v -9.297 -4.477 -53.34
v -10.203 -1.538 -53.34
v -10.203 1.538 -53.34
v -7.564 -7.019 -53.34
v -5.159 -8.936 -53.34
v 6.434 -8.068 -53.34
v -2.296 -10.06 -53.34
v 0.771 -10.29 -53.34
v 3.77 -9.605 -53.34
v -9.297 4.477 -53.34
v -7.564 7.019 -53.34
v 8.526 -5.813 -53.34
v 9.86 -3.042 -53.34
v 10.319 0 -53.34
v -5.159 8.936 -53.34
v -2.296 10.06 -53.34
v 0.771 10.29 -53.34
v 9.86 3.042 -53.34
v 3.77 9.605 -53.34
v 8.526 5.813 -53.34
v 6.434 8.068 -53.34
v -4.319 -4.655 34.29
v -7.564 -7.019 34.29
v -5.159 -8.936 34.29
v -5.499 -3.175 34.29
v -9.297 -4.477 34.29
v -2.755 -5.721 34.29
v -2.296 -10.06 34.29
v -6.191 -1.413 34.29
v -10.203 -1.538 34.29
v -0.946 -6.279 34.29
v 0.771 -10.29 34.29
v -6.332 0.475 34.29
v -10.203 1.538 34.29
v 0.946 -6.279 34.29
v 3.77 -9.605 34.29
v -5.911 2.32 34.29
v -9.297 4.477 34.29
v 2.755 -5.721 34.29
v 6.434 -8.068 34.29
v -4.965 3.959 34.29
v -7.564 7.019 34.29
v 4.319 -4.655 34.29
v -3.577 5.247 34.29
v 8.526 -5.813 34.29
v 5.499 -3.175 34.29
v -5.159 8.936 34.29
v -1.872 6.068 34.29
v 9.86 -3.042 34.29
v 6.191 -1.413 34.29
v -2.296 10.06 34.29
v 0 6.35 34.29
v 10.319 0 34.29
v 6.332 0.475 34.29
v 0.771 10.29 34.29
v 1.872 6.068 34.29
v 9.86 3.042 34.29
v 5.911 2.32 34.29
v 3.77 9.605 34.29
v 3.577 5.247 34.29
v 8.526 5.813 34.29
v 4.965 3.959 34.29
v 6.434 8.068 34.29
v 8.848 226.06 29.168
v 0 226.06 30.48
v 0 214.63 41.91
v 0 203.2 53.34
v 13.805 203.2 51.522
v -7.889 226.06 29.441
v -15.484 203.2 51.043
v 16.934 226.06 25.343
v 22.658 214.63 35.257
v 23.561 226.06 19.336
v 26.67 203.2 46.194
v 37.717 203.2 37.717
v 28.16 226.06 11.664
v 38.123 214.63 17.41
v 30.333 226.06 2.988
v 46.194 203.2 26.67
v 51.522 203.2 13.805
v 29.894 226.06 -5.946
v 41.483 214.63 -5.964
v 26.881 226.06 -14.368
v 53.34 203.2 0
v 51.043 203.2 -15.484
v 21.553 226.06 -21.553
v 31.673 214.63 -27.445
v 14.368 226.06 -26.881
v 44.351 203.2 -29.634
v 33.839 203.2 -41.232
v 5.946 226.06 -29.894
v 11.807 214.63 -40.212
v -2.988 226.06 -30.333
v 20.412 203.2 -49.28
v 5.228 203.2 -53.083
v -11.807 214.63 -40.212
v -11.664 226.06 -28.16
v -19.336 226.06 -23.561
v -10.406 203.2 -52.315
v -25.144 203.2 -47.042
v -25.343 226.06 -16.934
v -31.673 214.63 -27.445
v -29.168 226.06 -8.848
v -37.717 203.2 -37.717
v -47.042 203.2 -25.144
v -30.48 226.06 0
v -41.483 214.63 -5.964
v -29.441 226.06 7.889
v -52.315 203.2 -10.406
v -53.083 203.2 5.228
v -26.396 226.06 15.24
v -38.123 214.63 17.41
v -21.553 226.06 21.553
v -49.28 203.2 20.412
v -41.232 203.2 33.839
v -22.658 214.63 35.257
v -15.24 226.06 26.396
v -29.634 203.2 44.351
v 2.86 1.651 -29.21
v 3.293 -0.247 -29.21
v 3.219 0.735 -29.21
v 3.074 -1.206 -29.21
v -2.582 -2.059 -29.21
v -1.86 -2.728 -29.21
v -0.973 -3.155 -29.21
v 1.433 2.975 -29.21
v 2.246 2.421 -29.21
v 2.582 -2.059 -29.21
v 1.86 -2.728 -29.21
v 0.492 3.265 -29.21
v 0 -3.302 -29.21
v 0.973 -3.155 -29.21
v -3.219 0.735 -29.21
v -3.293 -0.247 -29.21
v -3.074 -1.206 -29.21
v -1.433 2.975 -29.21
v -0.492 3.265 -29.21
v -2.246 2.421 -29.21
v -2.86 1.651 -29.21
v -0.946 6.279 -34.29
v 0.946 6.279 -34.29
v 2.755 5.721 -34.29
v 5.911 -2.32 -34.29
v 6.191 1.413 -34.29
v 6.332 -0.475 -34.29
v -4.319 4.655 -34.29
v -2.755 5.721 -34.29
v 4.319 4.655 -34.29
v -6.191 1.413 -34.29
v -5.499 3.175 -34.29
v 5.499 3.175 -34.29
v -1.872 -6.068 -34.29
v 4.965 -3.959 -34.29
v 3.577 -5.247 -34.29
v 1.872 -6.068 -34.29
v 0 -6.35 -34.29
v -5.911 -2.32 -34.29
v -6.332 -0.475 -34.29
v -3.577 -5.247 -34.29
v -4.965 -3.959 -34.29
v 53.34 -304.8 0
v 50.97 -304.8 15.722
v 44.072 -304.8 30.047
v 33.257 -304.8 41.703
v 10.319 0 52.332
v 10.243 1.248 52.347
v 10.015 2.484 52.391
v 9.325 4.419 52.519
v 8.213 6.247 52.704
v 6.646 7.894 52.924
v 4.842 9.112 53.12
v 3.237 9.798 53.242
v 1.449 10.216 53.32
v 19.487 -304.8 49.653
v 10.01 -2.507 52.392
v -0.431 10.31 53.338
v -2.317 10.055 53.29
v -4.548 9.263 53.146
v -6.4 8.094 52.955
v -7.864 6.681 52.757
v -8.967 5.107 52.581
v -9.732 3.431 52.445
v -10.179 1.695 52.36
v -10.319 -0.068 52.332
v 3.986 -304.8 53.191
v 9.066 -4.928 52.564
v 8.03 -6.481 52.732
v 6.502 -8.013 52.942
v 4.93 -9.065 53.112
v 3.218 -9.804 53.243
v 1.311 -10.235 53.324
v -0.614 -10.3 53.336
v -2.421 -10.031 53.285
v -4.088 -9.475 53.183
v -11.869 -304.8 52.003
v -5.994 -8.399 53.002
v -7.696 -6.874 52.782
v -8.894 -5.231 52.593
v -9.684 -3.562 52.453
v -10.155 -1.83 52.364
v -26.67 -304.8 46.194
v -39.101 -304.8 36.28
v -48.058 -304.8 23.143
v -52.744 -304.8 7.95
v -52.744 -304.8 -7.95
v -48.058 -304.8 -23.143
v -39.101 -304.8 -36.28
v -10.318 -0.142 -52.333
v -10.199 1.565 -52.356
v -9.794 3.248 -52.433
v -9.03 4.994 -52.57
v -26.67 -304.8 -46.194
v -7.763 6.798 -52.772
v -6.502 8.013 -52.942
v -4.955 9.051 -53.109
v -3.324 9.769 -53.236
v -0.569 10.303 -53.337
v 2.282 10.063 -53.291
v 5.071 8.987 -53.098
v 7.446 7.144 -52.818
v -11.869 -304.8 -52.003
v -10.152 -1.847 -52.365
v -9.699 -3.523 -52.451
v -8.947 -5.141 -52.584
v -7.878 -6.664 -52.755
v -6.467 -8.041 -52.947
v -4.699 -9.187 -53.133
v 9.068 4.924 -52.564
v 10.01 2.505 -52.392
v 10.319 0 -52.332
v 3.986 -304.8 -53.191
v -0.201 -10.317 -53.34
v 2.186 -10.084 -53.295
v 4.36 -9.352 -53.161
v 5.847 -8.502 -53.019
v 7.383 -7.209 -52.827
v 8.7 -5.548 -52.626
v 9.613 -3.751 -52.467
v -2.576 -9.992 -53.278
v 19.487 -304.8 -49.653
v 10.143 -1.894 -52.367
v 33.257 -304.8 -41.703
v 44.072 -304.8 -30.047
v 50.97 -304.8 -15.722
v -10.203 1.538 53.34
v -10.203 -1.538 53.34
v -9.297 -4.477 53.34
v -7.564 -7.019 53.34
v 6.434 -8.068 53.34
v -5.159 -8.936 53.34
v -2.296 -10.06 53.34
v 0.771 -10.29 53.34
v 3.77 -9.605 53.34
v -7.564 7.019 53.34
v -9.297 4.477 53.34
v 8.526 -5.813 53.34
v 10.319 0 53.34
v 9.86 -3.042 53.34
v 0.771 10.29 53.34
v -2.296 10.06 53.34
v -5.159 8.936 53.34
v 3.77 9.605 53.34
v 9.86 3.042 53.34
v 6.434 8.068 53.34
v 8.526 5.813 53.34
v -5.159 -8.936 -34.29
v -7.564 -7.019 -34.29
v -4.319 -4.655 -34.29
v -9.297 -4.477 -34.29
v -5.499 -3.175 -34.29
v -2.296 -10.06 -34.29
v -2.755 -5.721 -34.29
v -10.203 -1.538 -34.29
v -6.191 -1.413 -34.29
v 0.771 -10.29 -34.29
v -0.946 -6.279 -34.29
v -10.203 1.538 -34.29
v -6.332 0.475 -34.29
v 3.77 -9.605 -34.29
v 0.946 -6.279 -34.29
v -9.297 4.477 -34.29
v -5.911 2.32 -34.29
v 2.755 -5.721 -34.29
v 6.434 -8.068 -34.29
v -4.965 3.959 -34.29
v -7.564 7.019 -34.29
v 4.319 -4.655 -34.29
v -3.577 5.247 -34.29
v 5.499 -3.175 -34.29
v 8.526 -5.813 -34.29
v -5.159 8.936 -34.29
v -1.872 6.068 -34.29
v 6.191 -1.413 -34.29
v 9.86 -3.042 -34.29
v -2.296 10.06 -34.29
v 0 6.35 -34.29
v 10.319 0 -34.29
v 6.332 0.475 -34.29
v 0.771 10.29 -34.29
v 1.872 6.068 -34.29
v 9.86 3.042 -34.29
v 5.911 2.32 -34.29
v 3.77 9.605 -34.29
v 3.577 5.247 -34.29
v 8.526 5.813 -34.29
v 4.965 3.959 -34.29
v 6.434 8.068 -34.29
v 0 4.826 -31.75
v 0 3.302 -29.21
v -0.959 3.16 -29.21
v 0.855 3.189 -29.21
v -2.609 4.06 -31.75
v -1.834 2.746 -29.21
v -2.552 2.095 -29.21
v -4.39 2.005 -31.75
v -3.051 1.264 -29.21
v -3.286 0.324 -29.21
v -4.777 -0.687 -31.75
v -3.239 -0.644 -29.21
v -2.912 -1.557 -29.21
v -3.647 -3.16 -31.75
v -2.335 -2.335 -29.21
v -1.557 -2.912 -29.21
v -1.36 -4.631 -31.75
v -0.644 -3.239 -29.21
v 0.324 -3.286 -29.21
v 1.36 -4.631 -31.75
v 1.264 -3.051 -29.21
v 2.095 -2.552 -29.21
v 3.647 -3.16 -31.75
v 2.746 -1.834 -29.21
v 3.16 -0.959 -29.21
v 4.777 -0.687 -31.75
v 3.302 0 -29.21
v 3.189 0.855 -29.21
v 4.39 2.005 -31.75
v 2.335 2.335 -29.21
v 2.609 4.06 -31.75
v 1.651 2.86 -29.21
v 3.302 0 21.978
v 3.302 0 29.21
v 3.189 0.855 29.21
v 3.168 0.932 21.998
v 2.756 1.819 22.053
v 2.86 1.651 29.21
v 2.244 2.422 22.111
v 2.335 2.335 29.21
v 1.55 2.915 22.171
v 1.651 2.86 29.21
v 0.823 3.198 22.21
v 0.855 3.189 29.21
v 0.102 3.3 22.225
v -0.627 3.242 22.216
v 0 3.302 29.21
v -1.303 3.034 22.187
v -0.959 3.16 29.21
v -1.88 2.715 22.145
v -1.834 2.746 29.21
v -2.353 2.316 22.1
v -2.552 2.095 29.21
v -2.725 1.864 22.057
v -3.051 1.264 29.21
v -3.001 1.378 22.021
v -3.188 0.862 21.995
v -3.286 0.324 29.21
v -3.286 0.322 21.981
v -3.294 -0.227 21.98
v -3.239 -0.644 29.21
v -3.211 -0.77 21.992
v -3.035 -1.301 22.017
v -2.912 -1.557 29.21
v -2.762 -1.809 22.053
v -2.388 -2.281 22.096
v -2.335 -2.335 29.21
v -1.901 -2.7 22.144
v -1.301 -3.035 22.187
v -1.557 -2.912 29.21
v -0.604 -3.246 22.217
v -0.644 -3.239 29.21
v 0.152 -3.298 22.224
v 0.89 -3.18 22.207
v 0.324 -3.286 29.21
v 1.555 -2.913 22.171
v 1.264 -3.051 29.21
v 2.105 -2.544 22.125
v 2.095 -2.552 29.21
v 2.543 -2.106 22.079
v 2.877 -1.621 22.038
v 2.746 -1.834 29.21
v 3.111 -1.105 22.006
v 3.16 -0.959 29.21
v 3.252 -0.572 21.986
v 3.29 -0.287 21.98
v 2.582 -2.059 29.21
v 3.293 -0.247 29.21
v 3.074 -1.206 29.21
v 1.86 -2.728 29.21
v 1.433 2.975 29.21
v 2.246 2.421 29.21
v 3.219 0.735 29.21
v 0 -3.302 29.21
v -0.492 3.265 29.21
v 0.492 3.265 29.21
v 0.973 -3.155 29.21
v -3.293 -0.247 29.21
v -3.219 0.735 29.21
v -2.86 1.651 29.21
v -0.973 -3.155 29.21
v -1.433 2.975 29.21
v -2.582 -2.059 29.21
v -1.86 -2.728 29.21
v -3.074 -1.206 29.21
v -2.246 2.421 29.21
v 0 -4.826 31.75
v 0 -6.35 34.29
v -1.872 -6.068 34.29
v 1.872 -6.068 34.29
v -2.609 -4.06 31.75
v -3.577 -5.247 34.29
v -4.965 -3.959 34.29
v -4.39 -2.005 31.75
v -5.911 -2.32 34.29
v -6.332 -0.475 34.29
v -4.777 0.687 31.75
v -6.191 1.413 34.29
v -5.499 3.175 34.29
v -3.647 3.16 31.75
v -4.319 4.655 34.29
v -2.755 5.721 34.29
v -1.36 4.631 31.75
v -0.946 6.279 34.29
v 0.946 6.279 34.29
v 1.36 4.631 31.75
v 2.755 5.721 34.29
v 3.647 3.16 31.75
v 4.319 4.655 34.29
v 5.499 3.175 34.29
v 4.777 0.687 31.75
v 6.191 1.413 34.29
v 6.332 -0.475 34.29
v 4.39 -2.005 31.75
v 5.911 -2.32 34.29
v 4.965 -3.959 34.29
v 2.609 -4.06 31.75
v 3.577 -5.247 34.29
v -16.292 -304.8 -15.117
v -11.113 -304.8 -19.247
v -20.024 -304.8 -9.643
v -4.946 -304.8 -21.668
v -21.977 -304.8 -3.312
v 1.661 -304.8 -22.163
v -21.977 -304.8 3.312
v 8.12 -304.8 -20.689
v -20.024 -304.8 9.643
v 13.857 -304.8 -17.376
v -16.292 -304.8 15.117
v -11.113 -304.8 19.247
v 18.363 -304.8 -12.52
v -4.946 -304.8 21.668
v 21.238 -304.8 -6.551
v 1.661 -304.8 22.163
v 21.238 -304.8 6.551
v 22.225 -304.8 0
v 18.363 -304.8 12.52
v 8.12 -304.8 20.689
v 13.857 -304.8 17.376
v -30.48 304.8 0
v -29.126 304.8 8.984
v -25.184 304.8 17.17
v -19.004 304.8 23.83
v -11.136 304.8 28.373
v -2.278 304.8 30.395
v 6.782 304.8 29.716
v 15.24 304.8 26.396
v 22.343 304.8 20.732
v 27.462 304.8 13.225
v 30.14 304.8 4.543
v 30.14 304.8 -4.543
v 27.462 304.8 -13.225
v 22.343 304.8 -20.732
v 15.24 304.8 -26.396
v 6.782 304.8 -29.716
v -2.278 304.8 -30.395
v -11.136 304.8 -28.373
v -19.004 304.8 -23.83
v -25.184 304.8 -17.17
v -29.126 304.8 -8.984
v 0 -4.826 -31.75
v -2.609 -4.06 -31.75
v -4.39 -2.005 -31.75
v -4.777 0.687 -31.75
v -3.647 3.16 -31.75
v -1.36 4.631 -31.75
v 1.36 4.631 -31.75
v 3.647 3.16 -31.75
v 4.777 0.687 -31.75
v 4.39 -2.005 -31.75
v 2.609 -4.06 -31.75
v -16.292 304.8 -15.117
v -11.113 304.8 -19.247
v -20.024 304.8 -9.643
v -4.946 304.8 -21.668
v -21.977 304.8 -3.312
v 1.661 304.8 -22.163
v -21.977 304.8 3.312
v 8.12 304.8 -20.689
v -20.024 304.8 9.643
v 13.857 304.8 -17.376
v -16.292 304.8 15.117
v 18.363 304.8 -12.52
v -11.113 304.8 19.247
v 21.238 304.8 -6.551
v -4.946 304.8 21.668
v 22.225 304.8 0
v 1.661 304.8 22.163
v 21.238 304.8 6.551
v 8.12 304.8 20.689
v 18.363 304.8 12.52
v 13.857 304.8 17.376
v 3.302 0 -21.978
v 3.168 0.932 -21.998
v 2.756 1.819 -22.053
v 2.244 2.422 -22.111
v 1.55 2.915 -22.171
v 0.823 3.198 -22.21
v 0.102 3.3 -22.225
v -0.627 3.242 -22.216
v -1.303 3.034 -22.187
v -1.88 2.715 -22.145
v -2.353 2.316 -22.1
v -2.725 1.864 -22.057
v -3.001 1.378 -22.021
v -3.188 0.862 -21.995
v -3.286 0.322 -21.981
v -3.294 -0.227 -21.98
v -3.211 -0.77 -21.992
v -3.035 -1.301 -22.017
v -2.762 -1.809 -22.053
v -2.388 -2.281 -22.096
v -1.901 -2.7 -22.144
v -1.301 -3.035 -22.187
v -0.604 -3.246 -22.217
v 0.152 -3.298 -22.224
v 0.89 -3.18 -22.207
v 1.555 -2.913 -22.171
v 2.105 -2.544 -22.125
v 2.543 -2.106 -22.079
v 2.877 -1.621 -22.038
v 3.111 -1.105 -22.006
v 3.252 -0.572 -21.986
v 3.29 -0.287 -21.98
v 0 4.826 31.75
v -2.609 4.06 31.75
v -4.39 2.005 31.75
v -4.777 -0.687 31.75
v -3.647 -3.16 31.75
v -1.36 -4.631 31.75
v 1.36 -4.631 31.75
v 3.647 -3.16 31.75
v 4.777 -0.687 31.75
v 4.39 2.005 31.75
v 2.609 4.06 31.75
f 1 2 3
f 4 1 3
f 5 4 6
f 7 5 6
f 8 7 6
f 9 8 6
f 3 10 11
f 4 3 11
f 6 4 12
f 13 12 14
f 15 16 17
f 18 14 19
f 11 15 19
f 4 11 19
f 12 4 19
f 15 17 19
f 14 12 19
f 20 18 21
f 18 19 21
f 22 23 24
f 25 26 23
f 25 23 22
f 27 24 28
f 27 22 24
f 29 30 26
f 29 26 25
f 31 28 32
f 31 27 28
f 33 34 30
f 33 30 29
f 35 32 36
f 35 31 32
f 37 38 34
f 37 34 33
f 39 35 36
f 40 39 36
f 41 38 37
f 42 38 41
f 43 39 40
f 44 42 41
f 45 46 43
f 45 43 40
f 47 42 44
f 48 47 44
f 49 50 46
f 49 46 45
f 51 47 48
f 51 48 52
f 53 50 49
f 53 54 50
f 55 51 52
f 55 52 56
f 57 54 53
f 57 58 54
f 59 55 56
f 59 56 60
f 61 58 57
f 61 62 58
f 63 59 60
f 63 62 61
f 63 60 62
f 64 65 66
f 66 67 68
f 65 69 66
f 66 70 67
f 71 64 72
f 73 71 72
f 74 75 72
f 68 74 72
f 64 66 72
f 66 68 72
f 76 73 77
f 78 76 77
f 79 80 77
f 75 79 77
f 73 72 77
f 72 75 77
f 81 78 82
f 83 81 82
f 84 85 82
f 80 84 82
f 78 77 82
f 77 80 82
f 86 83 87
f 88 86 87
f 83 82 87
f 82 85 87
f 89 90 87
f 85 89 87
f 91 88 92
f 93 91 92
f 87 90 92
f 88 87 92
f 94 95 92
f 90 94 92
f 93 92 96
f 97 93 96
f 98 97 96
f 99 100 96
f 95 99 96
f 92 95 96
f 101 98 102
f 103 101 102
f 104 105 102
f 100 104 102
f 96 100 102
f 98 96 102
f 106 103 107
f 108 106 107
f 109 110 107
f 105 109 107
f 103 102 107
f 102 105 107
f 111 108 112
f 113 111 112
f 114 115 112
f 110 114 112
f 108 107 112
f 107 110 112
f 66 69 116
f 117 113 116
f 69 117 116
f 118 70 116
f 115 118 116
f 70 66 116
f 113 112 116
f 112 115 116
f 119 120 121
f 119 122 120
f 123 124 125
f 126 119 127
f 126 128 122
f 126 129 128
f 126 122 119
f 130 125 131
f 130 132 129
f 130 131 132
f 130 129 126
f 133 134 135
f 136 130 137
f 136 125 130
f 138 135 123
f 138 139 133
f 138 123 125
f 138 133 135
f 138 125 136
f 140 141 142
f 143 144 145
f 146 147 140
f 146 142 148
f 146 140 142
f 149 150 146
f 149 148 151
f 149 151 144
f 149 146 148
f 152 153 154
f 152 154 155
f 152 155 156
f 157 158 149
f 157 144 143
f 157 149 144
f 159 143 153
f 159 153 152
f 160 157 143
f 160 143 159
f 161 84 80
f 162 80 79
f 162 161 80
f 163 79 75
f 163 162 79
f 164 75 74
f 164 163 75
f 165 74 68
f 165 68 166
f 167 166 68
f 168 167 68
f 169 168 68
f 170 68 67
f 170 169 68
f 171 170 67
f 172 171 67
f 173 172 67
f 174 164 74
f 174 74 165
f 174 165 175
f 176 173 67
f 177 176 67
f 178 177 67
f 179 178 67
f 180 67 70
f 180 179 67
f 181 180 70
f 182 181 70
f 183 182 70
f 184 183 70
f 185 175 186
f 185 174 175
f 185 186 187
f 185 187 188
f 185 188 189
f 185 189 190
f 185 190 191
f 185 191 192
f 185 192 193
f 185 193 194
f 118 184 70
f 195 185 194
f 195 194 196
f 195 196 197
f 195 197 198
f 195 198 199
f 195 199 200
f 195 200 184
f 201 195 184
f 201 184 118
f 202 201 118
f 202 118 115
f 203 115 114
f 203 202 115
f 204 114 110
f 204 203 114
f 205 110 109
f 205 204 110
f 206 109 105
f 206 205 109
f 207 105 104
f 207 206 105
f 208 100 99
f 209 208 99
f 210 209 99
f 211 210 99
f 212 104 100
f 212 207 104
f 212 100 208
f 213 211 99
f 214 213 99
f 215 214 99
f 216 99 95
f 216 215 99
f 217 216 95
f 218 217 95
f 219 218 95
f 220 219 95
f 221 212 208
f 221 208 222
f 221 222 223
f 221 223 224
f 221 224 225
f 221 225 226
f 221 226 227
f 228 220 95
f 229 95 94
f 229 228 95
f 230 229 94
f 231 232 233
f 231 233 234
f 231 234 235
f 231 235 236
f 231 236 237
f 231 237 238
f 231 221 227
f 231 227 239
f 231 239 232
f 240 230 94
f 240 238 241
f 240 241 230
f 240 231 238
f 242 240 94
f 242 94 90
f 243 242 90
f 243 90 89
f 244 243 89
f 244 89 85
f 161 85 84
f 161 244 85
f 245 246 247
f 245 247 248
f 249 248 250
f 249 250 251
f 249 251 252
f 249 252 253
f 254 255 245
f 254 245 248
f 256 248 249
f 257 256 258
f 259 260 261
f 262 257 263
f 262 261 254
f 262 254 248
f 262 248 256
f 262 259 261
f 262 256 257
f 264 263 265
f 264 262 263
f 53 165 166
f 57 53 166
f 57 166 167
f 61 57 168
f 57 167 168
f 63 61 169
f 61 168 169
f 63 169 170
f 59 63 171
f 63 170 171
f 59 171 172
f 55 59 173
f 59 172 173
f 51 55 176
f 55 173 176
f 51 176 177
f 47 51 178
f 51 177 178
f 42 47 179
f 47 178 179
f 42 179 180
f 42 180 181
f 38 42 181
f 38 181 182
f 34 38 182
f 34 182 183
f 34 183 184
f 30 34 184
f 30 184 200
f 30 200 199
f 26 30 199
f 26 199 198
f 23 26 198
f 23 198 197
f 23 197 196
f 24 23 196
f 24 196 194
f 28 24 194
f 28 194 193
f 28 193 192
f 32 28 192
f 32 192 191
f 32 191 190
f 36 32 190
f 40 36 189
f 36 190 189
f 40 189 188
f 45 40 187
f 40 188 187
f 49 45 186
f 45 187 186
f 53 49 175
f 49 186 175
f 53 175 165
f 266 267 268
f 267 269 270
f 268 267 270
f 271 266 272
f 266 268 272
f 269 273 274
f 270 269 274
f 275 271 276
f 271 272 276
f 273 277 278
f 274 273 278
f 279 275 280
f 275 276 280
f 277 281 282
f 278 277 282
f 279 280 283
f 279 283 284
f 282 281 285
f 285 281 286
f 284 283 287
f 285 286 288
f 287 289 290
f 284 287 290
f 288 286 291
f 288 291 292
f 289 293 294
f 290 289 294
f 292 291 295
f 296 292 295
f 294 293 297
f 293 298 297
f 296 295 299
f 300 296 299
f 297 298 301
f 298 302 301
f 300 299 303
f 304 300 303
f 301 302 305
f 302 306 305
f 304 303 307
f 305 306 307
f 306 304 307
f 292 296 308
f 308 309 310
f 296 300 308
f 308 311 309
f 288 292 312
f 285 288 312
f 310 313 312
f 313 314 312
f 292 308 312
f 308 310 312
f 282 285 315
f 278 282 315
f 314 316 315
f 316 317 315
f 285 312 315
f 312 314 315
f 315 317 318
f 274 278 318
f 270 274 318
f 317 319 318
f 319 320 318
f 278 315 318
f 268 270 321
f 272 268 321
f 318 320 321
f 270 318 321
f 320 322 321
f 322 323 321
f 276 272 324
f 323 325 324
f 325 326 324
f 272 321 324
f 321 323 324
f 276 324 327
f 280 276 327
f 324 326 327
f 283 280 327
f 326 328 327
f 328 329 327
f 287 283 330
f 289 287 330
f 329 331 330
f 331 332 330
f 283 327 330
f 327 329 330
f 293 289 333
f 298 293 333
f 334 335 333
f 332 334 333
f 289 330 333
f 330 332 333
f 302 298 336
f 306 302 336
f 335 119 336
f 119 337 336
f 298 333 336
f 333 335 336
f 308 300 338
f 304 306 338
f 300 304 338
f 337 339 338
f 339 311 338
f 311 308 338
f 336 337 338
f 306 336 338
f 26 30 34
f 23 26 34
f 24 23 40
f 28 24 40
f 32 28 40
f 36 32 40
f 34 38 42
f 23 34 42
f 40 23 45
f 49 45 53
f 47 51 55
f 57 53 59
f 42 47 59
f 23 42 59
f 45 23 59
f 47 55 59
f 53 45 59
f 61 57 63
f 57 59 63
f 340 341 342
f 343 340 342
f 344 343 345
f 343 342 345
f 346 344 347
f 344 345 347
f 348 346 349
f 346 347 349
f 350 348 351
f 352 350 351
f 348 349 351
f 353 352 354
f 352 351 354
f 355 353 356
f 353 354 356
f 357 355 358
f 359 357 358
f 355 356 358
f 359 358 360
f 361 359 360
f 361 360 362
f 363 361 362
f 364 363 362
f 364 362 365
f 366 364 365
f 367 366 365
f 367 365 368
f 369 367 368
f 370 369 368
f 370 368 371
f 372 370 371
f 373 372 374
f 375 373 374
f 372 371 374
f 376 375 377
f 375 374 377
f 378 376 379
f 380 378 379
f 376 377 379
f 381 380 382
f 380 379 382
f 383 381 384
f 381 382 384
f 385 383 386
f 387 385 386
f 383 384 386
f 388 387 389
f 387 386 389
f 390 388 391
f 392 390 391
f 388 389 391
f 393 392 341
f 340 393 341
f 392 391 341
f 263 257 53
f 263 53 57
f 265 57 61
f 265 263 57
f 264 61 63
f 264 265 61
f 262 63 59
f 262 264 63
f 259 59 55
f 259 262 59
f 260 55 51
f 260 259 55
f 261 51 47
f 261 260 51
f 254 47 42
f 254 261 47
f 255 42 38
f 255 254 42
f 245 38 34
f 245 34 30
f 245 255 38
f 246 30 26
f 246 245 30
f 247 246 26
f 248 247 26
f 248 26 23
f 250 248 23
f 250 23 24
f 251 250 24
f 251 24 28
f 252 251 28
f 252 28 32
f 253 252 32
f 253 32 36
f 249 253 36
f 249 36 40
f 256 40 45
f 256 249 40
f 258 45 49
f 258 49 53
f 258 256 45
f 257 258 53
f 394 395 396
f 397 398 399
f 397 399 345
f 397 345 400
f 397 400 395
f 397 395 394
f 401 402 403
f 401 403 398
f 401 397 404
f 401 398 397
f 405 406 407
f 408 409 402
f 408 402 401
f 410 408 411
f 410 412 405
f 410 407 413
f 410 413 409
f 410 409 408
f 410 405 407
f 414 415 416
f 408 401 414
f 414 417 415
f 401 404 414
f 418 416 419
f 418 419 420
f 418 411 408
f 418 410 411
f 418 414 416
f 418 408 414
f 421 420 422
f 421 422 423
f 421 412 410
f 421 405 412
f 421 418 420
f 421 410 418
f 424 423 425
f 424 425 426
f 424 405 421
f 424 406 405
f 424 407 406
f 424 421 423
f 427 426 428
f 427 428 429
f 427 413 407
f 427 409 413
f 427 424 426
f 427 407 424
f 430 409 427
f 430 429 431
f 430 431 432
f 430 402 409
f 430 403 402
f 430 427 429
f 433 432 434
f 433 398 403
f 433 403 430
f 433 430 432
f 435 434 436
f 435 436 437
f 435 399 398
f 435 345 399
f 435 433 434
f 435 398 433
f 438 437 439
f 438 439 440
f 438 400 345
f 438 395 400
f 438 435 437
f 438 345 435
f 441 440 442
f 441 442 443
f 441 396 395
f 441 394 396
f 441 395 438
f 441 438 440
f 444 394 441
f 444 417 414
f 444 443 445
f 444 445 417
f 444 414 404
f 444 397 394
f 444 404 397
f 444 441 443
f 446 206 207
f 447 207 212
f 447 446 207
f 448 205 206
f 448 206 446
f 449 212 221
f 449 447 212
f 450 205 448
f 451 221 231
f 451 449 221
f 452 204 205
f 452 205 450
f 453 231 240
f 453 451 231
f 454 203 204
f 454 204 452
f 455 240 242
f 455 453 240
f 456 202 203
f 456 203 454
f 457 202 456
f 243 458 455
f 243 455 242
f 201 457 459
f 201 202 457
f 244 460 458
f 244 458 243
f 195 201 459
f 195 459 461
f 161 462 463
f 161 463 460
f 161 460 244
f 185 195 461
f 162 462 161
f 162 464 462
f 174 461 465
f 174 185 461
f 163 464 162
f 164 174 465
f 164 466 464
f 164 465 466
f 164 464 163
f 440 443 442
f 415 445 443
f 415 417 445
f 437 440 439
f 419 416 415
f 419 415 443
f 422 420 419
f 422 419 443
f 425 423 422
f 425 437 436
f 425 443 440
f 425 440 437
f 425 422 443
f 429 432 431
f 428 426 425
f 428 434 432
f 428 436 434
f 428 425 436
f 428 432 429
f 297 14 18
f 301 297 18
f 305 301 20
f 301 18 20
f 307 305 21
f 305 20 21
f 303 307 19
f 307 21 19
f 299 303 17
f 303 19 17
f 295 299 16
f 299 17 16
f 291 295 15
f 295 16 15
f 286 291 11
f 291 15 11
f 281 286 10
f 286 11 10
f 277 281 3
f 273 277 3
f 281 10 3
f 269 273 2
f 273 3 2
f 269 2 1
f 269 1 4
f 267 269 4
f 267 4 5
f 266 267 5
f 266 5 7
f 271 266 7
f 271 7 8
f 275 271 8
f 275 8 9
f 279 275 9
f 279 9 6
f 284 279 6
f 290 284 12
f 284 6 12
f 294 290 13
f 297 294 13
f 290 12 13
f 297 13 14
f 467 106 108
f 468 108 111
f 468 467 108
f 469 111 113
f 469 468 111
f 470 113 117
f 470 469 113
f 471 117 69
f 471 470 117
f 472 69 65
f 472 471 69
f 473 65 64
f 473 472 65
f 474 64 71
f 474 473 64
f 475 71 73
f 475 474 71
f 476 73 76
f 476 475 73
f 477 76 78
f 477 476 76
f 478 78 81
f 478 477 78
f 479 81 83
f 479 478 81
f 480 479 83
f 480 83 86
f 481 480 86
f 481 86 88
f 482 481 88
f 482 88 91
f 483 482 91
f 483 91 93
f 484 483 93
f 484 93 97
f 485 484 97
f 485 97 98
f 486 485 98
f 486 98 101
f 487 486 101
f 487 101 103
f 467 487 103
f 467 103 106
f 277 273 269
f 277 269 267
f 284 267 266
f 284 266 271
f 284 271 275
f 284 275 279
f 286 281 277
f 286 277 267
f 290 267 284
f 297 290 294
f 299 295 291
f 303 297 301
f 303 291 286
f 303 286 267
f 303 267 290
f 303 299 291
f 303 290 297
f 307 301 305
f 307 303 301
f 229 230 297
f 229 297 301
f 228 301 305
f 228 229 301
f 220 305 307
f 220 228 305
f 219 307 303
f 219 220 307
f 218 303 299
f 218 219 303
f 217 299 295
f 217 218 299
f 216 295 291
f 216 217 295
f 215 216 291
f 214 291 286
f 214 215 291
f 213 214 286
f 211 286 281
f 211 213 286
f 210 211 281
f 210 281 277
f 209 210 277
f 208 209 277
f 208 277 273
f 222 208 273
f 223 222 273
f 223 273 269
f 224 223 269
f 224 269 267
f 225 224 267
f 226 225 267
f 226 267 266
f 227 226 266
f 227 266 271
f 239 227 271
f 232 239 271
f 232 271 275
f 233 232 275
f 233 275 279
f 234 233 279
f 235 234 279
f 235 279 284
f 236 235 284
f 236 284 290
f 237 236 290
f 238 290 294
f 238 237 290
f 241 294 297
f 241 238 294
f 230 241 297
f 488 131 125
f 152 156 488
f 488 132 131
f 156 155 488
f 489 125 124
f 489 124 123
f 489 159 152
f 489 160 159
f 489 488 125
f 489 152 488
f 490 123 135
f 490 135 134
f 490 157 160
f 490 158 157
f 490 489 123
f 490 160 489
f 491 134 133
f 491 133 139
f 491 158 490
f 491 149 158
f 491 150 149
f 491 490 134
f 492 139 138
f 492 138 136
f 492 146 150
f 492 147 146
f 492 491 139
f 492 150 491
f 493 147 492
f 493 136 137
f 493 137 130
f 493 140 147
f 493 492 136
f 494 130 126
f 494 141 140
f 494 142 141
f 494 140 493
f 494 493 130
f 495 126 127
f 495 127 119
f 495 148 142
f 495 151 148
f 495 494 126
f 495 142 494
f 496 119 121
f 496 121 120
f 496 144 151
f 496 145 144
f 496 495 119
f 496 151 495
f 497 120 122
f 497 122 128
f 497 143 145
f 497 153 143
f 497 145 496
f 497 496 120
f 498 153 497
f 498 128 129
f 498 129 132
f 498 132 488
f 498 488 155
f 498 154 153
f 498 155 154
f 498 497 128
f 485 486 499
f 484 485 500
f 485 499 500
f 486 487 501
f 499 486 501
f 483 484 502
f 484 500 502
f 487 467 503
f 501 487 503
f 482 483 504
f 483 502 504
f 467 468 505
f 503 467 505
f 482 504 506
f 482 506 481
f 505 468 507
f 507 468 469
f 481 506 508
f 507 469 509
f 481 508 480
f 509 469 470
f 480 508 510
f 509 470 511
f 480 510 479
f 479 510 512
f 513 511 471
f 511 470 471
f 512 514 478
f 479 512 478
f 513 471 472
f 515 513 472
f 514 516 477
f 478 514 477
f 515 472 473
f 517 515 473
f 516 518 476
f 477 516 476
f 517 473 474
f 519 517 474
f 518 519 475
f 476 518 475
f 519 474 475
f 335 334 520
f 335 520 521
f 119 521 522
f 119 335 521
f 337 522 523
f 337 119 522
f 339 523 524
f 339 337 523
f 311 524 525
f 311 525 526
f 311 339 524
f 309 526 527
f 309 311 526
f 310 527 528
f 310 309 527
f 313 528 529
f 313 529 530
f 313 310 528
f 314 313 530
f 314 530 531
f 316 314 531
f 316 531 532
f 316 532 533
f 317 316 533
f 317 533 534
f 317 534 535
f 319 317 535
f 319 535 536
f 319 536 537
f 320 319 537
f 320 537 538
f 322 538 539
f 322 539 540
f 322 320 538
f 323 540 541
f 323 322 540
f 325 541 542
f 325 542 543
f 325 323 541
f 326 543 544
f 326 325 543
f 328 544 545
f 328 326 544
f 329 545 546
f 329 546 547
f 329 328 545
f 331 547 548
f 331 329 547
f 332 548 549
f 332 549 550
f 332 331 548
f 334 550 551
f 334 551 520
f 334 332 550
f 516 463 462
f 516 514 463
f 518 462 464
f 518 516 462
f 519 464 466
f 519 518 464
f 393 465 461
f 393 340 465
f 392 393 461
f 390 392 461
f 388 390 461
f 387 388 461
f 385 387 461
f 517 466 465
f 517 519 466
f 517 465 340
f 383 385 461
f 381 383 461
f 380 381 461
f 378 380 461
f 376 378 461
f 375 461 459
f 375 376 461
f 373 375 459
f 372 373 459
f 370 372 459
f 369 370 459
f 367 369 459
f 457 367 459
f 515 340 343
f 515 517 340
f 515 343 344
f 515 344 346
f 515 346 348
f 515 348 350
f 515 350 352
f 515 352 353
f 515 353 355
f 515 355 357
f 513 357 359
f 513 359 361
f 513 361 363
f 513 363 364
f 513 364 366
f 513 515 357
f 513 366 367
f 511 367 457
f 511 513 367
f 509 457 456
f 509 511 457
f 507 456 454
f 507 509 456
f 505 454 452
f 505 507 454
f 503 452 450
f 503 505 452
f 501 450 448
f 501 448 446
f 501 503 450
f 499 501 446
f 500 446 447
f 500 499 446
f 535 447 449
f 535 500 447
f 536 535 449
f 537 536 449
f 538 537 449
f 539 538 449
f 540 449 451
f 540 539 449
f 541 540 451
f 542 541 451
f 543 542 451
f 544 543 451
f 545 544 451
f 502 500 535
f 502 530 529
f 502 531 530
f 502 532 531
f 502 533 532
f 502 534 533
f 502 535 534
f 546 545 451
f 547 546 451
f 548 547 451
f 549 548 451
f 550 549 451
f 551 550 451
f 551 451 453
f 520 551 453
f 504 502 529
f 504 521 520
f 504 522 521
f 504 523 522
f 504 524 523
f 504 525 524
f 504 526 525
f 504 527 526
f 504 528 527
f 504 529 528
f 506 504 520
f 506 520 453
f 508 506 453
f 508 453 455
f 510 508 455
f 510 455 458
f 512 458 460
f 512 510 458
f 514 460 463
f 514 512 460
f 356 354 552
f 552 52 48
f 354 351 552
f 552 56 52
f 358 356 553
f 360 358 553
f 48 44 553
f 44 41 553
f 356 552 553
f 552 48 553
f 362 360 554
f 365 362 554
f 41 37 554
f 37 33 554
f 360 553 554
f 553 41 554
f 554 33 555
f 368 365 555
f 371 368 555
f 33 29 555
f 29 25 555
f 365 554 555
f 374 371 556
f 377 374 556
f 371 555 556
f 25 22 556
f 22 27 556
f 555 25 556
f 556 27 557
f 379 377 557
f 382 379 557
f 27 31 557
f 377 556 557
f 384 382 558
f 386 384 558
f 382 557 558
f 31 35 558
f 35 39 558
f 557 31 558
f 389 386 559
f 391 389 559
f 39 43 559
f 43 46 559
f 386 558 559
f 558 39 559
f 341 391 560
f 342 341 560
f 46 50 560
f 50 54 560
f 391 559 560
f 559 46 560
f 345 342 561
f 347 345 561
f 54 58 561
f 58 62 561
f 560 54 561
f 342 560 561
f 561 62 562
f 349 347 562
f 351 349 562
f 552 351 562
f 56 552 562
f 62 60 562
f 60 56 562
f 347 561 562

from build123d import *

# Parameters (mm, degrees)
F0_R      = 53.34
F0_R_2    = 22.225
F1_DEPTH  = 304.8
F4_R      = 53.34
F4_R_2    = 30.48
F5_DEPTH  = 101.6
F10_R     = 10.31875
F10_R_2   = 3.302
F11_DEPTH = 19.05
F12_DEPTH = 32.3616602869
F13_R     = 10.31875
F13_R_2   = 3.302
F14_DEPTH = 19.05
F15_DEPTH = 32.3616602869
F20_R     = 10.31875
F21_DEPTH = 19.05
F22_R     = 10.31875
F23_DEPTH = 19.05


with BuildPart() as f1:
    # F0 (on Front) → F1 (new body, symmetric)
    with BuildSketch(Plane.XZ):
        Circle(F0_R)
        Circle(F0_R_2, mode=Mode.SUBTRACT)
    extrude(amount=F1_DEPTH, both=True)

    # F4 (on offset) → F5 (cut)
    with BuildSketch(Plane(origin=(0, 304.8, 0), x_dir=(-1, 0, 0), z_dir=(0, 1, 0))):
        Circle(F4_R)
        Circle(F4_R_2, mode=Mode.SUBTRACT)
    extrude(amount=-F5_DEPTH, mode=Mode.SUBTRACT)

    # F6 (on Right) → F7 (revolve)
    with BuildSketch(Plane.YZ):
        Polygon((203.2, 53.34), (203.2, 30.48), (226.06, 30.48), align=None)
    revolve(axis=Axis((0, 101.6, 0), (0, 1, 0)))

    # F10 (on offset) → F11 (cut)
    with BuildSketch(Plane.XY.offset(53.34)):
        Circle(F10_R)
        Circle(F10_R_2, mode=Mode.SUBTRACT)
        Circle(F10_R_2)
    extrude(amount=-F11_DEPTH, mode=Mode.SUBTRACT)

    # F10 (on offset) → F12 (cut, up to face)
    with BuildSketch(Plane.XY.offset(53.34)):
        Circle(F10_R_2)
    extrude(amount=-F12_DEPTH, mode=Mode.SUBTRACT)

    # F13 (on offset) → F14 (cut)
    with BuildSketch(Plane.XY.offset(-53.34)):
        Circle(F13_R)
        Circle(F13_R_2, mode=Mode.SUBTRACT)
        Circle(F13_R_2)
    extrude(amount=F14_DEPTH, mode=Mode.SUBTRACT)

    # F13 (on offset) → F15 (cut, up to face)
    with BuildSketch(Plane.XY.offset(-53.34)):
        Circle(F13_R_2)
    extrude(amount=F15_DEPTH, mode=Mode.SUBTRACT)

    # F16 (on Right) → F17 (revolve, cut)
    with BuildSketch(Plane.YZ):
        Polygon((6.35, 34.29), (3.302, 34.29), (3.302, 29.21), align=None)
        Polygon((6.35, -34.29), (3.302, -29.21), (3.302, -34.29), align=None)
    revolve(axis=Axis((0, 0, 17.145), (0, 0, 1)), mode=Mode.SUBTRACT)


with BuildPart() as f19:
    # F18 (on Right) → F19 (revolve)
    with BuildSketch(Plane.YZ):
        Polygon((0, 29.21), (0, 34.29), (-6.35, 34.29), (-3.302, 29.21), align=None)
    revolve(axis=Axis((0, 0, 14.605), (0, 0, -1)))


with BuildPart() as f19b:
    # F18 (on Right) → F19, piece 2 (revolve)
    with BuildSketch(Plane.YZ):
        Polygon((0, -29.21), (-3.302, -29.21), (-6.35, -34.29), (0, -34.29), align=None)
    revolve(axis=Axis((0, 0, 14.605), (0, 0, -1)))


with BuildPart() as f21:
    # F20 (on offset) → F21 (new body, through all)
    with BuildSketch(Plane.XY.offset(53.34)):
        Circle(F20_R)
    extrude(amount=-F21_DEPTH)


with BuildPart() as f23:
    # F22 (on offset) → F23 (new body, through all)
    with BuildSketch(Plane.XY.offset(-53.34)):
        Circle(F22_R)
    extrude(amount=F23_DEPTH)


solid = Compound([f1.part, f19.part, f19b.part, f21.part, f23.part])
